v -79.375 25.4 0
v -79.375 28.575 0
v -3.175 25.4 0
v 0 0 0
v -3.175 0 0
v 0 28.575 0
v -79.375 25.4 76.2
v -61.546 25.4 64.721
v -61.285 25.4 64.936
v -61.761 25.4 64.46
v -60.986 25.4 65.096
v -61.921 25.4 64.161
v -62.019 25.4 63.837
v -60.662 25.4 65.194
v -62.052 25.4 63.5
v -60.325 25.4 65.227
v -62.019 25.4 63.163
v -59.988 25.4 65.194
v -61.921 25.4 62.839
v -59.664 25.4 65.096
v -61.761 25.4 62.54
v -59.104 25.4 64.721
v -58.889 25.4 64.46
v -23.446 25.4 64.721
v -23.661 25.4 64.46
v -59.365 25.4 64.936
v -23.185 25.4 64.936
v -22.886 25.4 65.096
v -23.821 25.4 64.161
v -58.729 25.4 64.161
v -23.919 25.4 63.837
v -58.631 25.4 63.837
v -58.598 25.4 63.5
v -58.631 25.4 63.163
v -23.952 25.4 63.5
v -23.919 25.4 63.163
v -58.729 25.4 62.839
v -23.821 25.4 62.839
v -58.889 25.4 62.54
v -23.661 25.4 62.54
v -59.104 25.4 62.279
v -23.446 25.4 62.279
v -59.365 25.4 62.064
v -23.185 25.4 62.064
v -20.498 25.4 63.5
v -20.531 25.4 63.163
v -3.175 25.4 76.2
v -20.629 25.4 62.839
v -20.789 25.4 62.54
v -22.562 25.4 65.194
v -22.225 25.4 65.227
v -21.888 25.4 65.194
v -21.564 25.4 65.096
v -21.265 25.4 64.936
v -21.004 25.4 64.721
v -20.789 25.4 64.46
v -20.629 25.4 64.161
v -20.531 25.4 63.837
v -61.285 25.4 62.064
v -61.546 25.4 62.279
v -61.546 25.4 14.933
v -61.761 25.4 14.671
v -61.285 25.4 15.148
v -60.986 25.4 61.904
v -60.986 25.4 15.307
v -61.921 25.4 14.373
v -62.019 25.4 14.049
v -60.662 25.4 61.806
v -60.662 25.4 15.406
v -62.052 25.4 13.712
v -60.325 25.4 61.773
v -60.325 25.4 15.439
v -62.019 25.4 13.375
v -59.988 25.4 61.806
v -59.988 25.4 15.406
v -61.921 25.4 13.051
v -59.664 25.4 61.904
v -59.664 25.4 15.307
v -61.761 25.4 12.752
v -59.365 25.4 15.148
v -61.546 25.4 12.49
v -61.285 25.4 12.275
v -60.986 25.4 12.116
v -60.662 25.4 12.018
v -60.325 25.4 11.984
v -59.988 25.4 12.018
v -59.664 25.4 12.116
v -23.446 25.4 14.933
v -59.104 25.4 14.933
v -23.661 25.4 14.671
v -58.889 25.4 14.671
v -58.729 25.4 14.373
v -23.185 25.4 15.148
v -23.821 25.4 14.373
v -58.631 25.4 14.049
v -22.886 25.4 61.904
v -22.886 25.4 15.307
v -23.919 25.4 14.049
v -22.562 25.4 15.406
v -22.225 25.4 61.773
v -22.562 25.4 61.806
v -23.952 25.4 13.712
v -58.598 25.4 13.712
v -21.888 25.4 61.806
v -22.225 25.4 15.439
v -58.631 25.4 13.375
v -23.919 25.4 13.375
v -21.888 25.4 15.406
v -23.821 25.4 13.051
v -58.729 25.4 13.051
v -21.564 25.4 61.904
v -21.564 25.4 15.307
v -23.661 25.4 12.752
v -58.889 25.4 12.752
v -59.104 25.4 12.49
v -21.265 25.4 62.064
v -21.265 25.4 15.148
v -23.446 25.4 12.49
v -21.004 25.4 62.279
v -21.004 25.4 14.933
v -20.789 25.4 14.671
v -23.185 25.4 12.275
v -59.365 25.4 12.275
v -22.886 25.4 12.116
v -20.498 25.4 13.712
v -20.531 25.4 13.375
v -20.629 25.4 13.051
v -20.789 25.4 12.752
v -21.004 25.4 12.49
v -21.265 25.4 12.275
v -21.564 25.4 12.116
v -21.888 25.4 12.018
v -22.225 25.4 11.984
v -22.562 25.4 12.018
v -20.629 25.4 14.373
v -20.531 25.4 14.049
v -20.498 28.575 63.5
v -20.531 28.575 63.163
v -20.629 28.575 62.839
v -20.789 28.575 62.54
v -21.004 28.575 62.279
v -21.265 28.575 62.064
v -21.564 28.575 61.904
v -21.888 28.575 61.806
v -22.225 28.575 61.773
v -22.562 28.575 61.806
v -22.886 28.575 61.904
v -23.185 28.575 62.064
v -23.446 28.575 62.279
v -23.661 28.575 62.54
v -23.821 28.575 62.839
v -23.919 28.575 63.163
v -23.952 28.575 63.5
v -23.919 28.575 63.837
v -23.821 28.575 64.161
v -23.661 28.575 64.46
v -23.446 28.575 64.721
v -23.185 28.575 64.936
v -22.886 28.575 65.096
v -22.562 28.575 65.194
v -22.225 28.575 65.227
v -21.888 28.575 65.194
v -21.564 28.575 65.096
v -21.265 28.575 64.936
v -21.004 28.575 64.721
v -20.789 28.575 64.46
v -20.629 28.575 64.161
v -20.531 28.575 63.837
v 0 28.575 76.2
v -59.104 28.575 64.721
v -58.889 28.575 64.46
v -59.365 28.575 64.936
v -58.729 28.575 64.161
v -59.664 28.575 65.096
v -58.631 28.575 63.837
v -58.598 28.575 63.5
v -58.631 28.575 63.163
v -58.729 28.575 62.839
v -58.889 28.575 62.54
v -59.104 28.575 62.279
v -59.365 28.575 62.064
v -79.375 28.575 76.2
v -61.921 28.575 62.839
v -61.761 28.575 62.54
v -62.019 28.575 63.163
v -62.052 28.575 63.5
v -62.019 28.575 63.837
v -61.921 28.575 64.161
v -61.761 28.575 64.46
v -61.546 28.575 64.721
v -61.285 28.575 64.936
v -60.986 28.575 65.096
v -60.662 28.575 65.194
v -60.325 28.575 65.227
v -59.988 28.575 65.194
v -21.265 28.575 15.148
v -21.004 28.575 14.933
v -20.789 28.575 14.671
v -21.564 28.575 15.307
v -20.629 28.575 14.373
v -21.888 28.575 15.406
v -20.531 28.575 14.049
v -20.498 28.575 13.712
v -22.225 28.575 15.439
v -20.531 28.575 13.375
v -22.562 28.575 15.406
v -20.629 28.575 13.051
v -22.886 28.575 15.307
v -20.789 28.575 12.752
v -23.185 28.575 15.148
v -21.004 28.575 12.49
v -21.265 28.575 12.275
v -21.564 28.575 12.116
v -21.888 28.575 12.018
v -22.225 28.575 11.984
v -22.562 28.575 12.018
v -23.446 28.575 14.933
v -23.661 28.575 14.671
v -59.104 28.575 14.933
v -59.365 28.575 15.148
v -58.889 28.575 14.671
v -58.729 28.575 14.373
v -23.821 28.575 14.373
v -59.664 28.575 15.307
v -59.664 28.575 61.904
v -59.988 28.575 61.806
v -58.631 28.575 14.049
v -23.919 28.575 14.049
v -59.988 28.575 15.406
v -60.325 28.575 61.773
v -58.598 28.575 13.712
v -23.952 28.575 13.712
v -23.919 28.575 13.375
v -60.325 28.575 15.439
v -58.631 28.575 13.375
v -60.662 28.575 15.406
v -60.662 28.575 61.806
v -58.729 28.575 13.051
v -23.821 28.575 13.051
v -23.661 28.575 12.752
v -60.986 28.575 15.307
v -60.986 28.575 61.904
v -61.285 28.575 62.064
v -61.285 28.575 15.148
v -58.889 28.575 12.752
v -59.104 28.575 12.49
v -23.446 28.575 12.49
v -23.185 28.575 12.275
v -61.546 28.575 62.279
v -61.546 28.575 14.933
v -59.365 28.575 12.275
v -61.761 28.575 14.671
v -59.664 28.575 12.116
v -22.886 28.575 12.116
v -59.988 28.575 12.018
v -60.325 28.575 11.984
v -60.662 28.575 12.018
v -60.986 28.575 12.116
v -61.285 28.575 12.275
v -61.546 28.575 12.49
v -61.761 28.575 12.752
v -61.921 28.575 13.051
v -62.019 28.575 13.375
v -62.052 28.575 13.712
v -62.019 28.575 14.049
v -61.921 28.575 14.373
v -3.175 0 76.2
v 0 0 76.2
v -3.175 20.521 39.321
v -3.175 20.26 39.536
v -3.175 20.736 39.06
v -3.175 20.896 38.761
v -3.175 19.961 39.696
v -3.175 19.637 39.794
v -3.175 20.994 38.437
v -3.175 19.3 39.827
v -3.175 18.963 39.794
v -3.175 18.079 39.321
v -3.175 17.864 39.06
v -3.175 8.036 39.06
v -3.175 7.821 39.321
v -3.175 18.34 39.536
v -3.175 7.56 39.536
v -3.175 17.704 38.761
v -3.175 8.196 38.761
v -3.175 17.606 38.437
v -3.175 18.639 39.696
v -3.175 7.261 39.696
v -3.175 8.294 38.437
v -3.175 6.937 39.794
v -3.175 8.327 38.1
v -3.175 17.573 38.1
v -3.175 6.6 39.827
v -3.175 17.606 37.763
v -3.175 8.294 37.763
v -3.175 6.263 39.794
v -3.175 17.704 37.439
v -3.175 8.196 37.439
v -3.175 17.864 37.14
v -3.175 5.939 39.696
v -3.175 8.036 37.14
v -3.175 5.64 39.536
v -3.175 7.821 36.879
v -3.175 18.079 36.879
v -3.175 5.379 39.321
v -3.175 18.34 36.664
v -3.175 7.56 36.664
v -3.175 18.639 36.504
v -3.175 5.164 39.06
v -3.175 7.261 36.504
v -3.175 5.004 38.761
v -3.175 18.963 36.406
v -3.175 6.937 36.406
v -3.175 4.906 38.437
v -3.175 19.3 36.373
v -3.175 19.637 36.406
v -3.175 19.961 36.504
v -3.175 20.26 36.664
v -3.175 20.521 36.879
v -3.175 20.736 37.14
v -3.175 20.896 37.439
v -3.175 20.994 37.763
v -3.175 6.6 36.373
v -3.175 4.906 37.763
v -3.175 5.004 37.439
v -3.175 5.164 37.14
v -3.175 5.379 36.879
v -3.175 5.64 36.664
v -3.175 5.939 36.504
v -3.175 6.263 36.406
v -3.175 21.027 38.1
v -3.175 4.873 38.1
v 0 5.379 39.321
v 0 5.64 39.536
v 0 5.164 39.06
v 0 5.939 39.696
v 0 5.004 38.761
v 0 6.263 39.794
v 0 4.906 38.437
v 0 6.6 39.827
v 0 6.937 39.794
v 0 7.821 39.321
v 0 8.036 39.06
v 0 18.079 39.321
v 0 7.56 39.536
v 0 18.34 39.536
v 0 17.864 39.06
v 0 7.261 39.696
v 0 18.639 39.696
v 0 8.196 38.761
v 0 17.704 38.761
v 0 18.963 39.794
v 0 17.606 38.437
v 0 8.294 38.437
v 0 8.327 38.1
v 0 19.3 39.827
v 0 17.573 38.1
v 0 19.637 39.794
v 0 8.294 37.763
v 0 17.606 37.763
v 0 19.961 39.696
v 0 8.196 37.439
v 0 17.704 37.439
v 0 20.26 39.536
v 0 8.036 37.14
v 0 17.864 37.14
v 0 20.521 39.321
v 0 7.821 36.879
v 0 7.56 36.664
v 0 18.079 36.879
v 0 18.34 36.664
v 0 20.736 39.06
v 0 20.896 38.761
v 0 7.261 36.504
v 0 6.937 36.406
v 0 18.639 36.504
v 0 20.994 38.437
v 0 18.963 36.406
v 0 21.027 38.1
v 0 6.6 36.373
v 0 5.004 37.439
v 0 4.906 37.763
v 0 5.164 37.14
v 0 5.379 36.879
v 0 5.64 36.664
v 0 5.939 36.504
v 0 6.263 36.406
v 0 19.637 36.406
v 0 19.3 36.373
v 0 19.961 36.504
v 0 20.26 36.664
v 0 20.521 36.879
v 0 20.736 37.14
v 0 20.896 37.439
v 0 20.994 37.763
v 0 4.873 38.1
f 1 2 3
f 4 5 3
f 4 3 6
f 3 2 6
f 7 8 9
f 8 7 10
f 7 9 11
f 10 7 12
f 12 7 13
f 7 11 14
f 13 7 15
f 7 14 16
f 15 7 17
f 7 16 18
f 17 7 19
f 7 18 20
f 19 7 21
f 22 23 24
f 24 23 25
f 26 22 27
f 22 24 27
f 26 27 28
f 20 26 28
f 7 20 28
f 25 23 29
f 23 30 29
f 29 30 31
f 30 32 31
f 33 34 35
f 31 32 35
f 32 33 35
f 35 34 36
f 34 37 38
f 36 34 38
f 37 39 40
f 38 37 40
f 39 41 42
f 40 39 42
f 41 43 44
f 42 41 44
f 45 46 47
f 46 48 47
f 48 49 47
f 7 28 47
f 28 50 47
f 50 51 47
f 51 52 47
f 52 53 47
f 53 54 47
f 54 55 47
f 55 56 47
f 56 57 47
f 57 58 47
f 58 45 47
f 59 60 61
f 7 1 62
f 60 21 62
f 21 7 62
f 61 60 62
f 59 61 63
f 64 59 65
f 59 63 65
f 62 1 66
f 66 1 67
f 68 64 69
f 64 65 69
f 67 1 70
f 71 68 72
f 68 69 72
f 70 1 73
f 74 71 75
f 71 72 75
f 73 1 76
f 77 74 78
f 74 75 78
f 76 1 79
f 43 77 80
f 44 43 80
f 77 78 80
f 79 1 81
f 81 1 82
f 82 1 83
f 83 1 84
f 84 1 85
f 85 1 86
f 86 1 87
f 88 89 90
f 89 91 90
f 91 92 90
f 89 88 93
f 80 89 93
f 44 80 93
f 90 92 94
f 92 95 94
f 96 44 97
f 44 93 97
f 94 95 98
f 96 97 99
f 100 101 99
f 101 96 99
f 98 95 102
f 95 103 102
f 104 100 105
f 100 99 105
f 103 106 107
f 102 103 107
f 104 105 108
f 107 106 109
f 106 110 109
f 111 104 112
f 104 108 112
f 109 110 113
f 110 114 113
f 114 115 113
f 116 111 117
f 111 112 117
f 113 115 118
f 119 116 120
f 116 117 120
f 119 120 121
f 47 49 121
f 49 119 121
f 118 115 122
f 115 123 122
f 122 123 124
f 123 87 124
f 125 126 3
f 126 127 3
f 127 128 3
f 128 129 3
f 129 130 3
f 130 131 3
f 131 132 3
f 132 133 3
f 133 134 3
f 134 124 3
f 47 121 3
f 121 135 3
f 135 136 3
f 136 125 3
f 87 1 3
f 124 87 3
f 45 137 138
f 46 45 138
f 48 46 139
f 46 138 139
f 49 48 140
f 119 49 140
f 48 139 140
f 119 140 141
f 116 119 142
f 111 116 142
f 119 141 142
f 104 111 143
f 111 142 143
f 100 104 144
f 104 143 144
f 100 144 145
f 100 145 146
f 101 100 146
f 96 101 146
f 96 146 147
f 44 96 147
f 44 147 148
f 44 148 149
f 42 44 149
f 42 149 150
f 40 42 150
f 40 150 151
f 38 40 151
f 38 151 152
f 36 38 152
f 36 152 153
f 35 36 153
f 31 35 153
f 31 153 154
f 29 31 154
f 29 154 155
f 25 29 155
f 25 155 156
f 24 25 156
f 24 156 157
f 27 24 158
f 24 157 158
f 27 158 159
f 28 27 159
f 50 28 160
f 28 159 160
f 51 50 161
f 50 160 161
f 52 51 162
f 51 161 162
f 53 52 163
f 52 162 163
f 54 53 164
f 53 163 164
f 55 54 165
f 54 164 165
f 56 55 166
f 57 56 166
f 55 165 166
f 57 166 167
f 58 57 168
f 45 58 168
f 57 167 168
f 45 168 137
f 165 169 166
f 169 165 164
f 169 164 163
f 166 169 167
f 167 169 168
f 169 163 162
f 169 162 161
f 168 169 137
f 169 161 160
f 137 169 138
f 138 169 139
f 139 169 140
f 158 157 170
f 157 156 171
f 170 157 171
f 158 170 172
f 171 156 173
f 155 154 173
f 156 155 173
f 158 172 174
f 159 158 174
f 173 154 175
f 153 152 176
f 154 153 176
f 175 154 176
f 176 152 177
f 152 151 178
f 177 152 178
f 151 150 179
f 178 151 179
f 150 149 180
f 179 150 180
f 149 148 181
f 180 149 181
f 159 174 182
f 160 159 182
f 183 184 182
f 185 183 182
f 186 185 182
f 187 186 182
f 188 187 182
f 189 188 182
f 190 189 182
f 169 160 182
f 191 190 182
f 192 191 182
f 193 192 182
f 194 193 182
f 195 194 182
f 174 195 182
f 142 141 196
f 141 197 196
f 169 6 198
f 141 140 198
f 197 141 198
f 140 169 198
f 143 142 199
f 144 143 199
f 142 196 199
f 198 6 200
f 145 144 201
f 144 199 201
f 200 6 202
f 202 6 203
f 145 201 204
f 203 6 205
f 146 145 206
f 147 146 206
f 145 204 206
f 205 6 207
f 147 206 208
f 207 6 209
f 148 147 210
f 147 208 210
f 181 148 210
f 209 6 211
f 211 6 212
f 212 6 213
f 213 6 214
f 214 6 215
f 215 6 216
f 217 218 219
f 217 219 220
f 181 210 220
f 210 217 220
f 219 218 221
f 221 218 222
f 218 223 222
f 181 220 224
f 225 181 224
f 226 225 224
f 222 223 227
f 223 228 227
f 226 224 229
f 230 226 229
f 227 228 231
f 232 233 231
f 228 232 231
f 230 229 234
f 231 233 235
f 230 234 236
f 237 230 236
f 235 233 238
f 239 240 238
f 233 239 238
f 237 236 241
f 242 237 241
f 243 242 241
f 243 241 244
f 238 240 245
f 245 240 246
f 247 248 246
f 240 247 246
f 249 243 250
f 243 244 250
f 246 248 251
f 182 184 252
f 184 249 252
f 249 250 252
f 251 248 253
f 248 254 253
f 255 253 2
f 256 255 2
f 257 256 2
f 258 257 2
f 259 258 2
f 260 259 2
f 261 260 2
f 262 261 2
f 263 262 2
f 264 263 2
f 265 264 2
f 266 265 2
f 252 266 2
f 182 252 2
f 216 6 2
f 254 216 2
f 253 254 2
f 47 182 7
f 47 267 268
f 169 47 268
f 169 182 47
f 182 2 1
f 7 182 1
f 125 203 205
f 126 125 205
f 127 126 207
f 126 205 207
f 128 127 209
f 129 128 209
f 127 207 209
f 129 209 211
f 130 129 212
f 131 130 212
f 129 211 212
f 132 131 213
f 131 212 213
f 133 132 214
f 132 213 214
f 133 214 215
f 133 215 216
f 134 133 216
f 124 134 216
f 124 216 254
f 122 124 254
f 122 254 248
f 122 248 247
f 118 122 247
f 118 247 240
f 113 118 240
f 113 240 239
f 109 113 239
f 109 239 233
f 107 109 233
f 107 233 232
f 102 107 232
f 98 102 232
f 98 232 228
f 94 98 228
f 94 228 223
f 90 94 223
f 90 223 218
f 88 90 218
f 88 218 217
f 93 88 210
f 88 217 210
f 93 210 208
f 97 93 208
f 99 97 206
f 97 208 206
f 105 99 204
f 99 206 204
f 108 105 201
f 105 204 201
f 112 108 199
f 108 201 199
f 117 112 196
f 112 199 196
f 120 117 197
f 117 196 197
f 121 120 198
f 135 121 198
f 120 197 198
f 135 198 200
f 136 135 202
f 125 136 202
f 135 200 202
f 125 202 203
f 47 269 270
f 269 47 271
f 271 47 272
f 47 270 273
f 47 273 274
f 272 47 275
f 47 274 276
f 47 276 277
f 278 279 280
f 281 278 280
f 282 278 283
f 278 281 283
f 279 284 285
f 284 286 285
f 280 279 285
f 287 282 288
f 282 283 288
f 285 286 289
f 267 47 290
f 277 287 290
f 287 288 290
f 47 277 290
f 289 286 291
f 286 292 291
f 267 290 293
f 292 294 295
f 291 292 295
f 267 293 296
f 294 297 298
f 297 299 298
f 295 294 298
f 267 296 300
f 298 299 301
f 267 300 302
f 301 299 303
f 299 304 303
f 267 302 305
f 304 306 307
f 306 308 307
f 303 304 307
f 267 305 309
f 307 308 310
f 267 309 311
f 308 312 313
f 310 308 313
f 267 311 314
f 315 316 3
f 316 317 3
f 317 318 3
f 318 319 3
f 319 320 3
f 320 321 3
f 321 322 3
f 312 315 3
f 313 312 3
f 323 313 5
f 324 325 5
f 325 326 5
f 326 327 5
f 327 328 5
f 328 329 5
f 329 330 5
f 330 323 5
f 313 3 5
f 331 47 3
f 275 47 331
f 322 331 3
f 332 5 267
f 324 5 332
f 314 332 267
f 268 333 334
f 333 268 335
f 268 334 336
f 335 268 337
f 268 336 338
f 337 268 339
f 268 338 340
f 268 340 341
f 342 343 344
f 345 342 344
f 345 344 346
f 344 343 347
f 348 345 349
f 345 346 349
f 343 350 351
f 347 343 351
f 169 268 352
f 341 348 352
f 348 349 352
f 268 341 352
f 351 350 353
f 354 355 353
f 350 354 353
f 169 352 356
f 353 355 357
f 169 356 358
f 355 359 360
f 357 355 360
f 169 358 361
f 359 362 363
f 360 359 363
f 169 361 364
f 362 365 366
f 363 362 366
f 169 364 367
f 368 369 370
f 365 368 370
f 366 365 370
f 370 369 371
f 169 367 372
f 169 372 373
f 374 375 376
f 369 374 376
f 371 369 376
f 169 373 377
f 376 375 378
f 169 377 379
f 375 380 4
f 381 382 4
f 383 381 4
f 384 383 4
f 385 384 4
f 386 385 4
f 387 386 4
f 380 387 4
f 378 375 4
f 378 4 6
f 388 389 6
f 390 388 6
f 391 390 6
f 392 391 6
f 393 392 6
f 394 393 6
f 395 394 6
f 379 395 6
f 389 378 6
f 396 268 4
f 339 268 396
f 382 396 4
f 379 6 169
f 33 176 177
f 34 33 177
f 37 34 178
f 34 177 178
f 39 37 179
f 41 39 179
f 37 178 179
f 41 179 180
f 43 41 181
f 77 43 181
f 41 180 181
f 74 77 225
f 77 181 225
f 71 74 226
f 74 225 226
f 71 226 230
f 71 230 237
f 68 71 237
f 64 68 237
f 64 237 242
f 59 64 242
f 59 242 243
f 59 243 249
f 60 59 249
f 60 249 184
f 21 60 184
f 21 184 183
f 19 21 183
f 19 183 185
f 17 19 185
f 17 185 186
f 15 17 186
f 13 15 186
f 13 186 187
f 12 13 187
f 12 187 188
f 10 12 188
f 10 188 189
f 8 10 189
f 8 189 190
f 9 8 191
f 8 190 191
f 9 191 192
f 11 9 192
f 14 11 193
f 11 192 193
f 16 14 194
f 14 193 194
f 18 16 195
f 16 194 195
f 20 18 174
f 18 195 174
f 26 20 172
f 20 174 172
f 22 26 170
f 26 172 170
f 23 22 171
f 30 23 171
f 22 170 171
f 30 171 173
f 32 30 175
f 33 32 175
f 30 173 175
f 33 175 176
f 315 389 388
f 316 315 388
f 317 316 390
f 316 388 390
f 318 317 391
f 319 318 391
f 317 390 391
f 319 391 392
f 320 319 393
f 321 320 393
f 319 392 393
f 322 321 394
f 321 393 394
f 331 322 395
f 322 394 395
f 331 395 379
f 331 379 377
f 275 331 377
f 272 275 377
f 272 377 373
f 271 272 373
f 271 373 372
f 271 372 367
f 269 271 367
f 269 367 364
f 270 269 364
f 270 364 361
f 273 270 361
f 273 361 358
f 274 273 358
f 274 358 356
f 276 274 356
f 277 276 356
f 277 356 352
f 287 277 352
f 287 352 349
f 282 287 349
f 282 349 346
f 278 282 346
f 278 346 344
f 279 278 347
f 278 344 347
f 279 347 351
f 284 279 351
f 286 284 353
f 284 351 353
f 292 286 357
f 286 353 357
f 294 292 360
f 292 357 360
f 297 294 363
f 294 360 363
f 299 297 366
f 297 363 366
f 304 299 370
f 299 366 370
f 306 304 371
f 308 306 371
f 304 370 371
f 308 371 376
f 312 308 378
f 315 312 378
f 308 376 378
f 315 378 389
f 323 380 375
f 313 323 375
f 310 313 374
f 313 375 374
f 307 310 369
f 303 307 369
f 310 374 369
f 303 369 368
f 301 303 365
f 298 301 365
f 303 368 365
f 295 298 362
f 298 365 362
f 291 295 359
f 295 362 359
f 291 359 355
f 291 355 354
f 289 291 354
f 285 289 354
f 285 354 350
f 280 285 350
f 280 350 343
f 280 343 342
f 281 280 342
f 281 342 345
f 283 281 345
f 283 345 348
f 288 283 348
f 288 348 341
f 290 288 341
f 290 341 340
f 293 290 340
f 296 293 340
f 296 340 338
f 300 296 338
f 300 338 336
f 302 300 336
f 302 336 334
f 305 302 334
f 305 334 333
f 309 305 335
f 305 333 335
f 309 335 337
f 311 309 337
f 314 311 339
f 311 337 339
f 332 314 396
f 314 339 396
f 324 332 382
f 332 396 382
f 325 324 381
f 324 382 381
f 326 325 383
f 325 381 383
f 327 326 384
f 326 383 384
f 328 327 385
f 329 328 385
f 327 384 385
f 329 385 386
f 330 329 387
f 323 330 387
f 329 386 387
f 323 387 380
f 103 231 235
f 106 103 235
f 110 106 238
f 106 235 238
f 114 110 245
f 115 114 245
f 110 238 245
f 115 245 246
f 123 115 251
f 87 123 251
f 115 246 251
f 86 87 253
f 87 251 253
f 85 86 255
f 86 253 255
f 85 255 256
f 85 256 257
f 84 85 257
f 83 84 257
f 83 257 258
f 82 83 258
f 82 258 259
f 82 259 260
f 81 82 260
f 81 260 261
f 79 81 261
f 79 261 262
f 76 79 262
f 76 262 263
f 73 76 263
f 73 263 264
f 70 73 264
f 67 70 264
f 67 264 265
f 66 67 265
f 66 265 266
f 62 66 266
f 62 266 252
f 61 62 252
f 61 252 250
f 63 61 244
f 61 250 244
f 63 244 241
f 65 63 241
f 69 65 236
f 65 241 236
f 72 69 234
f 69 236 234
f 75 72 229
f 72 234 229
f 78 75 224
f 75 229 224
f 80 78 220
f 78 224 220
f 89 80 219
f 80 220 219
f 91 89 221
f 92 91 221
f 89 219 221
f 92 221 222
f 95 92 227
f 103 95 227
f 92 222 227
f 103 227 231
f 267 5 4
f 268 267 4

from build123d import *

# Parameters (mm, degrees)
BOSS_EXTRUDE1_DEPTH       = 76.2
TAP_DRILL_FOR_8_36_TAP1_D = 3.4544
TAP_DRILL_FOR_8_36_TAP2_D = 3.4544


with BuildPart() as part:
    # Sketch1 → Boss-Extrude1 (new body)
    with BuildSketch(Plane.XY):
        Polygon((0, 0), (0, 28.575), (-79.375, 28.575), (-79.375, 25.4), (-3.175, 25.4), (-3.175, 0), align=None)
    extrude(amount=BOSS_EXTRUDE1_DEPTH)

    # Tap Drill for #8-36 Tap1 (through all)
    with Locations(Plane.ZY.offset(3.175)):
        with Locations((38.1, 6.6), (38.1, 19.3)):
            Hole(TAP_DRILL_FOR_8_36_TAP1_D / 2)

    # Tap Drill for #8-36 Tap2 (through all)
    with Locations(Plane(origin=(0, 25.4, 0), x_dir=(-1, 0, 0), z_dir=(0, -1, 0))):
        with Locations((60.325, -63.5), (22.225, -63.5), (60.325, -13.711593905), (22.225, -13.711593905)):
            Hole(TAP_DRILL_FOR_8_36_TAP2_D / 2)


solid = part.part
